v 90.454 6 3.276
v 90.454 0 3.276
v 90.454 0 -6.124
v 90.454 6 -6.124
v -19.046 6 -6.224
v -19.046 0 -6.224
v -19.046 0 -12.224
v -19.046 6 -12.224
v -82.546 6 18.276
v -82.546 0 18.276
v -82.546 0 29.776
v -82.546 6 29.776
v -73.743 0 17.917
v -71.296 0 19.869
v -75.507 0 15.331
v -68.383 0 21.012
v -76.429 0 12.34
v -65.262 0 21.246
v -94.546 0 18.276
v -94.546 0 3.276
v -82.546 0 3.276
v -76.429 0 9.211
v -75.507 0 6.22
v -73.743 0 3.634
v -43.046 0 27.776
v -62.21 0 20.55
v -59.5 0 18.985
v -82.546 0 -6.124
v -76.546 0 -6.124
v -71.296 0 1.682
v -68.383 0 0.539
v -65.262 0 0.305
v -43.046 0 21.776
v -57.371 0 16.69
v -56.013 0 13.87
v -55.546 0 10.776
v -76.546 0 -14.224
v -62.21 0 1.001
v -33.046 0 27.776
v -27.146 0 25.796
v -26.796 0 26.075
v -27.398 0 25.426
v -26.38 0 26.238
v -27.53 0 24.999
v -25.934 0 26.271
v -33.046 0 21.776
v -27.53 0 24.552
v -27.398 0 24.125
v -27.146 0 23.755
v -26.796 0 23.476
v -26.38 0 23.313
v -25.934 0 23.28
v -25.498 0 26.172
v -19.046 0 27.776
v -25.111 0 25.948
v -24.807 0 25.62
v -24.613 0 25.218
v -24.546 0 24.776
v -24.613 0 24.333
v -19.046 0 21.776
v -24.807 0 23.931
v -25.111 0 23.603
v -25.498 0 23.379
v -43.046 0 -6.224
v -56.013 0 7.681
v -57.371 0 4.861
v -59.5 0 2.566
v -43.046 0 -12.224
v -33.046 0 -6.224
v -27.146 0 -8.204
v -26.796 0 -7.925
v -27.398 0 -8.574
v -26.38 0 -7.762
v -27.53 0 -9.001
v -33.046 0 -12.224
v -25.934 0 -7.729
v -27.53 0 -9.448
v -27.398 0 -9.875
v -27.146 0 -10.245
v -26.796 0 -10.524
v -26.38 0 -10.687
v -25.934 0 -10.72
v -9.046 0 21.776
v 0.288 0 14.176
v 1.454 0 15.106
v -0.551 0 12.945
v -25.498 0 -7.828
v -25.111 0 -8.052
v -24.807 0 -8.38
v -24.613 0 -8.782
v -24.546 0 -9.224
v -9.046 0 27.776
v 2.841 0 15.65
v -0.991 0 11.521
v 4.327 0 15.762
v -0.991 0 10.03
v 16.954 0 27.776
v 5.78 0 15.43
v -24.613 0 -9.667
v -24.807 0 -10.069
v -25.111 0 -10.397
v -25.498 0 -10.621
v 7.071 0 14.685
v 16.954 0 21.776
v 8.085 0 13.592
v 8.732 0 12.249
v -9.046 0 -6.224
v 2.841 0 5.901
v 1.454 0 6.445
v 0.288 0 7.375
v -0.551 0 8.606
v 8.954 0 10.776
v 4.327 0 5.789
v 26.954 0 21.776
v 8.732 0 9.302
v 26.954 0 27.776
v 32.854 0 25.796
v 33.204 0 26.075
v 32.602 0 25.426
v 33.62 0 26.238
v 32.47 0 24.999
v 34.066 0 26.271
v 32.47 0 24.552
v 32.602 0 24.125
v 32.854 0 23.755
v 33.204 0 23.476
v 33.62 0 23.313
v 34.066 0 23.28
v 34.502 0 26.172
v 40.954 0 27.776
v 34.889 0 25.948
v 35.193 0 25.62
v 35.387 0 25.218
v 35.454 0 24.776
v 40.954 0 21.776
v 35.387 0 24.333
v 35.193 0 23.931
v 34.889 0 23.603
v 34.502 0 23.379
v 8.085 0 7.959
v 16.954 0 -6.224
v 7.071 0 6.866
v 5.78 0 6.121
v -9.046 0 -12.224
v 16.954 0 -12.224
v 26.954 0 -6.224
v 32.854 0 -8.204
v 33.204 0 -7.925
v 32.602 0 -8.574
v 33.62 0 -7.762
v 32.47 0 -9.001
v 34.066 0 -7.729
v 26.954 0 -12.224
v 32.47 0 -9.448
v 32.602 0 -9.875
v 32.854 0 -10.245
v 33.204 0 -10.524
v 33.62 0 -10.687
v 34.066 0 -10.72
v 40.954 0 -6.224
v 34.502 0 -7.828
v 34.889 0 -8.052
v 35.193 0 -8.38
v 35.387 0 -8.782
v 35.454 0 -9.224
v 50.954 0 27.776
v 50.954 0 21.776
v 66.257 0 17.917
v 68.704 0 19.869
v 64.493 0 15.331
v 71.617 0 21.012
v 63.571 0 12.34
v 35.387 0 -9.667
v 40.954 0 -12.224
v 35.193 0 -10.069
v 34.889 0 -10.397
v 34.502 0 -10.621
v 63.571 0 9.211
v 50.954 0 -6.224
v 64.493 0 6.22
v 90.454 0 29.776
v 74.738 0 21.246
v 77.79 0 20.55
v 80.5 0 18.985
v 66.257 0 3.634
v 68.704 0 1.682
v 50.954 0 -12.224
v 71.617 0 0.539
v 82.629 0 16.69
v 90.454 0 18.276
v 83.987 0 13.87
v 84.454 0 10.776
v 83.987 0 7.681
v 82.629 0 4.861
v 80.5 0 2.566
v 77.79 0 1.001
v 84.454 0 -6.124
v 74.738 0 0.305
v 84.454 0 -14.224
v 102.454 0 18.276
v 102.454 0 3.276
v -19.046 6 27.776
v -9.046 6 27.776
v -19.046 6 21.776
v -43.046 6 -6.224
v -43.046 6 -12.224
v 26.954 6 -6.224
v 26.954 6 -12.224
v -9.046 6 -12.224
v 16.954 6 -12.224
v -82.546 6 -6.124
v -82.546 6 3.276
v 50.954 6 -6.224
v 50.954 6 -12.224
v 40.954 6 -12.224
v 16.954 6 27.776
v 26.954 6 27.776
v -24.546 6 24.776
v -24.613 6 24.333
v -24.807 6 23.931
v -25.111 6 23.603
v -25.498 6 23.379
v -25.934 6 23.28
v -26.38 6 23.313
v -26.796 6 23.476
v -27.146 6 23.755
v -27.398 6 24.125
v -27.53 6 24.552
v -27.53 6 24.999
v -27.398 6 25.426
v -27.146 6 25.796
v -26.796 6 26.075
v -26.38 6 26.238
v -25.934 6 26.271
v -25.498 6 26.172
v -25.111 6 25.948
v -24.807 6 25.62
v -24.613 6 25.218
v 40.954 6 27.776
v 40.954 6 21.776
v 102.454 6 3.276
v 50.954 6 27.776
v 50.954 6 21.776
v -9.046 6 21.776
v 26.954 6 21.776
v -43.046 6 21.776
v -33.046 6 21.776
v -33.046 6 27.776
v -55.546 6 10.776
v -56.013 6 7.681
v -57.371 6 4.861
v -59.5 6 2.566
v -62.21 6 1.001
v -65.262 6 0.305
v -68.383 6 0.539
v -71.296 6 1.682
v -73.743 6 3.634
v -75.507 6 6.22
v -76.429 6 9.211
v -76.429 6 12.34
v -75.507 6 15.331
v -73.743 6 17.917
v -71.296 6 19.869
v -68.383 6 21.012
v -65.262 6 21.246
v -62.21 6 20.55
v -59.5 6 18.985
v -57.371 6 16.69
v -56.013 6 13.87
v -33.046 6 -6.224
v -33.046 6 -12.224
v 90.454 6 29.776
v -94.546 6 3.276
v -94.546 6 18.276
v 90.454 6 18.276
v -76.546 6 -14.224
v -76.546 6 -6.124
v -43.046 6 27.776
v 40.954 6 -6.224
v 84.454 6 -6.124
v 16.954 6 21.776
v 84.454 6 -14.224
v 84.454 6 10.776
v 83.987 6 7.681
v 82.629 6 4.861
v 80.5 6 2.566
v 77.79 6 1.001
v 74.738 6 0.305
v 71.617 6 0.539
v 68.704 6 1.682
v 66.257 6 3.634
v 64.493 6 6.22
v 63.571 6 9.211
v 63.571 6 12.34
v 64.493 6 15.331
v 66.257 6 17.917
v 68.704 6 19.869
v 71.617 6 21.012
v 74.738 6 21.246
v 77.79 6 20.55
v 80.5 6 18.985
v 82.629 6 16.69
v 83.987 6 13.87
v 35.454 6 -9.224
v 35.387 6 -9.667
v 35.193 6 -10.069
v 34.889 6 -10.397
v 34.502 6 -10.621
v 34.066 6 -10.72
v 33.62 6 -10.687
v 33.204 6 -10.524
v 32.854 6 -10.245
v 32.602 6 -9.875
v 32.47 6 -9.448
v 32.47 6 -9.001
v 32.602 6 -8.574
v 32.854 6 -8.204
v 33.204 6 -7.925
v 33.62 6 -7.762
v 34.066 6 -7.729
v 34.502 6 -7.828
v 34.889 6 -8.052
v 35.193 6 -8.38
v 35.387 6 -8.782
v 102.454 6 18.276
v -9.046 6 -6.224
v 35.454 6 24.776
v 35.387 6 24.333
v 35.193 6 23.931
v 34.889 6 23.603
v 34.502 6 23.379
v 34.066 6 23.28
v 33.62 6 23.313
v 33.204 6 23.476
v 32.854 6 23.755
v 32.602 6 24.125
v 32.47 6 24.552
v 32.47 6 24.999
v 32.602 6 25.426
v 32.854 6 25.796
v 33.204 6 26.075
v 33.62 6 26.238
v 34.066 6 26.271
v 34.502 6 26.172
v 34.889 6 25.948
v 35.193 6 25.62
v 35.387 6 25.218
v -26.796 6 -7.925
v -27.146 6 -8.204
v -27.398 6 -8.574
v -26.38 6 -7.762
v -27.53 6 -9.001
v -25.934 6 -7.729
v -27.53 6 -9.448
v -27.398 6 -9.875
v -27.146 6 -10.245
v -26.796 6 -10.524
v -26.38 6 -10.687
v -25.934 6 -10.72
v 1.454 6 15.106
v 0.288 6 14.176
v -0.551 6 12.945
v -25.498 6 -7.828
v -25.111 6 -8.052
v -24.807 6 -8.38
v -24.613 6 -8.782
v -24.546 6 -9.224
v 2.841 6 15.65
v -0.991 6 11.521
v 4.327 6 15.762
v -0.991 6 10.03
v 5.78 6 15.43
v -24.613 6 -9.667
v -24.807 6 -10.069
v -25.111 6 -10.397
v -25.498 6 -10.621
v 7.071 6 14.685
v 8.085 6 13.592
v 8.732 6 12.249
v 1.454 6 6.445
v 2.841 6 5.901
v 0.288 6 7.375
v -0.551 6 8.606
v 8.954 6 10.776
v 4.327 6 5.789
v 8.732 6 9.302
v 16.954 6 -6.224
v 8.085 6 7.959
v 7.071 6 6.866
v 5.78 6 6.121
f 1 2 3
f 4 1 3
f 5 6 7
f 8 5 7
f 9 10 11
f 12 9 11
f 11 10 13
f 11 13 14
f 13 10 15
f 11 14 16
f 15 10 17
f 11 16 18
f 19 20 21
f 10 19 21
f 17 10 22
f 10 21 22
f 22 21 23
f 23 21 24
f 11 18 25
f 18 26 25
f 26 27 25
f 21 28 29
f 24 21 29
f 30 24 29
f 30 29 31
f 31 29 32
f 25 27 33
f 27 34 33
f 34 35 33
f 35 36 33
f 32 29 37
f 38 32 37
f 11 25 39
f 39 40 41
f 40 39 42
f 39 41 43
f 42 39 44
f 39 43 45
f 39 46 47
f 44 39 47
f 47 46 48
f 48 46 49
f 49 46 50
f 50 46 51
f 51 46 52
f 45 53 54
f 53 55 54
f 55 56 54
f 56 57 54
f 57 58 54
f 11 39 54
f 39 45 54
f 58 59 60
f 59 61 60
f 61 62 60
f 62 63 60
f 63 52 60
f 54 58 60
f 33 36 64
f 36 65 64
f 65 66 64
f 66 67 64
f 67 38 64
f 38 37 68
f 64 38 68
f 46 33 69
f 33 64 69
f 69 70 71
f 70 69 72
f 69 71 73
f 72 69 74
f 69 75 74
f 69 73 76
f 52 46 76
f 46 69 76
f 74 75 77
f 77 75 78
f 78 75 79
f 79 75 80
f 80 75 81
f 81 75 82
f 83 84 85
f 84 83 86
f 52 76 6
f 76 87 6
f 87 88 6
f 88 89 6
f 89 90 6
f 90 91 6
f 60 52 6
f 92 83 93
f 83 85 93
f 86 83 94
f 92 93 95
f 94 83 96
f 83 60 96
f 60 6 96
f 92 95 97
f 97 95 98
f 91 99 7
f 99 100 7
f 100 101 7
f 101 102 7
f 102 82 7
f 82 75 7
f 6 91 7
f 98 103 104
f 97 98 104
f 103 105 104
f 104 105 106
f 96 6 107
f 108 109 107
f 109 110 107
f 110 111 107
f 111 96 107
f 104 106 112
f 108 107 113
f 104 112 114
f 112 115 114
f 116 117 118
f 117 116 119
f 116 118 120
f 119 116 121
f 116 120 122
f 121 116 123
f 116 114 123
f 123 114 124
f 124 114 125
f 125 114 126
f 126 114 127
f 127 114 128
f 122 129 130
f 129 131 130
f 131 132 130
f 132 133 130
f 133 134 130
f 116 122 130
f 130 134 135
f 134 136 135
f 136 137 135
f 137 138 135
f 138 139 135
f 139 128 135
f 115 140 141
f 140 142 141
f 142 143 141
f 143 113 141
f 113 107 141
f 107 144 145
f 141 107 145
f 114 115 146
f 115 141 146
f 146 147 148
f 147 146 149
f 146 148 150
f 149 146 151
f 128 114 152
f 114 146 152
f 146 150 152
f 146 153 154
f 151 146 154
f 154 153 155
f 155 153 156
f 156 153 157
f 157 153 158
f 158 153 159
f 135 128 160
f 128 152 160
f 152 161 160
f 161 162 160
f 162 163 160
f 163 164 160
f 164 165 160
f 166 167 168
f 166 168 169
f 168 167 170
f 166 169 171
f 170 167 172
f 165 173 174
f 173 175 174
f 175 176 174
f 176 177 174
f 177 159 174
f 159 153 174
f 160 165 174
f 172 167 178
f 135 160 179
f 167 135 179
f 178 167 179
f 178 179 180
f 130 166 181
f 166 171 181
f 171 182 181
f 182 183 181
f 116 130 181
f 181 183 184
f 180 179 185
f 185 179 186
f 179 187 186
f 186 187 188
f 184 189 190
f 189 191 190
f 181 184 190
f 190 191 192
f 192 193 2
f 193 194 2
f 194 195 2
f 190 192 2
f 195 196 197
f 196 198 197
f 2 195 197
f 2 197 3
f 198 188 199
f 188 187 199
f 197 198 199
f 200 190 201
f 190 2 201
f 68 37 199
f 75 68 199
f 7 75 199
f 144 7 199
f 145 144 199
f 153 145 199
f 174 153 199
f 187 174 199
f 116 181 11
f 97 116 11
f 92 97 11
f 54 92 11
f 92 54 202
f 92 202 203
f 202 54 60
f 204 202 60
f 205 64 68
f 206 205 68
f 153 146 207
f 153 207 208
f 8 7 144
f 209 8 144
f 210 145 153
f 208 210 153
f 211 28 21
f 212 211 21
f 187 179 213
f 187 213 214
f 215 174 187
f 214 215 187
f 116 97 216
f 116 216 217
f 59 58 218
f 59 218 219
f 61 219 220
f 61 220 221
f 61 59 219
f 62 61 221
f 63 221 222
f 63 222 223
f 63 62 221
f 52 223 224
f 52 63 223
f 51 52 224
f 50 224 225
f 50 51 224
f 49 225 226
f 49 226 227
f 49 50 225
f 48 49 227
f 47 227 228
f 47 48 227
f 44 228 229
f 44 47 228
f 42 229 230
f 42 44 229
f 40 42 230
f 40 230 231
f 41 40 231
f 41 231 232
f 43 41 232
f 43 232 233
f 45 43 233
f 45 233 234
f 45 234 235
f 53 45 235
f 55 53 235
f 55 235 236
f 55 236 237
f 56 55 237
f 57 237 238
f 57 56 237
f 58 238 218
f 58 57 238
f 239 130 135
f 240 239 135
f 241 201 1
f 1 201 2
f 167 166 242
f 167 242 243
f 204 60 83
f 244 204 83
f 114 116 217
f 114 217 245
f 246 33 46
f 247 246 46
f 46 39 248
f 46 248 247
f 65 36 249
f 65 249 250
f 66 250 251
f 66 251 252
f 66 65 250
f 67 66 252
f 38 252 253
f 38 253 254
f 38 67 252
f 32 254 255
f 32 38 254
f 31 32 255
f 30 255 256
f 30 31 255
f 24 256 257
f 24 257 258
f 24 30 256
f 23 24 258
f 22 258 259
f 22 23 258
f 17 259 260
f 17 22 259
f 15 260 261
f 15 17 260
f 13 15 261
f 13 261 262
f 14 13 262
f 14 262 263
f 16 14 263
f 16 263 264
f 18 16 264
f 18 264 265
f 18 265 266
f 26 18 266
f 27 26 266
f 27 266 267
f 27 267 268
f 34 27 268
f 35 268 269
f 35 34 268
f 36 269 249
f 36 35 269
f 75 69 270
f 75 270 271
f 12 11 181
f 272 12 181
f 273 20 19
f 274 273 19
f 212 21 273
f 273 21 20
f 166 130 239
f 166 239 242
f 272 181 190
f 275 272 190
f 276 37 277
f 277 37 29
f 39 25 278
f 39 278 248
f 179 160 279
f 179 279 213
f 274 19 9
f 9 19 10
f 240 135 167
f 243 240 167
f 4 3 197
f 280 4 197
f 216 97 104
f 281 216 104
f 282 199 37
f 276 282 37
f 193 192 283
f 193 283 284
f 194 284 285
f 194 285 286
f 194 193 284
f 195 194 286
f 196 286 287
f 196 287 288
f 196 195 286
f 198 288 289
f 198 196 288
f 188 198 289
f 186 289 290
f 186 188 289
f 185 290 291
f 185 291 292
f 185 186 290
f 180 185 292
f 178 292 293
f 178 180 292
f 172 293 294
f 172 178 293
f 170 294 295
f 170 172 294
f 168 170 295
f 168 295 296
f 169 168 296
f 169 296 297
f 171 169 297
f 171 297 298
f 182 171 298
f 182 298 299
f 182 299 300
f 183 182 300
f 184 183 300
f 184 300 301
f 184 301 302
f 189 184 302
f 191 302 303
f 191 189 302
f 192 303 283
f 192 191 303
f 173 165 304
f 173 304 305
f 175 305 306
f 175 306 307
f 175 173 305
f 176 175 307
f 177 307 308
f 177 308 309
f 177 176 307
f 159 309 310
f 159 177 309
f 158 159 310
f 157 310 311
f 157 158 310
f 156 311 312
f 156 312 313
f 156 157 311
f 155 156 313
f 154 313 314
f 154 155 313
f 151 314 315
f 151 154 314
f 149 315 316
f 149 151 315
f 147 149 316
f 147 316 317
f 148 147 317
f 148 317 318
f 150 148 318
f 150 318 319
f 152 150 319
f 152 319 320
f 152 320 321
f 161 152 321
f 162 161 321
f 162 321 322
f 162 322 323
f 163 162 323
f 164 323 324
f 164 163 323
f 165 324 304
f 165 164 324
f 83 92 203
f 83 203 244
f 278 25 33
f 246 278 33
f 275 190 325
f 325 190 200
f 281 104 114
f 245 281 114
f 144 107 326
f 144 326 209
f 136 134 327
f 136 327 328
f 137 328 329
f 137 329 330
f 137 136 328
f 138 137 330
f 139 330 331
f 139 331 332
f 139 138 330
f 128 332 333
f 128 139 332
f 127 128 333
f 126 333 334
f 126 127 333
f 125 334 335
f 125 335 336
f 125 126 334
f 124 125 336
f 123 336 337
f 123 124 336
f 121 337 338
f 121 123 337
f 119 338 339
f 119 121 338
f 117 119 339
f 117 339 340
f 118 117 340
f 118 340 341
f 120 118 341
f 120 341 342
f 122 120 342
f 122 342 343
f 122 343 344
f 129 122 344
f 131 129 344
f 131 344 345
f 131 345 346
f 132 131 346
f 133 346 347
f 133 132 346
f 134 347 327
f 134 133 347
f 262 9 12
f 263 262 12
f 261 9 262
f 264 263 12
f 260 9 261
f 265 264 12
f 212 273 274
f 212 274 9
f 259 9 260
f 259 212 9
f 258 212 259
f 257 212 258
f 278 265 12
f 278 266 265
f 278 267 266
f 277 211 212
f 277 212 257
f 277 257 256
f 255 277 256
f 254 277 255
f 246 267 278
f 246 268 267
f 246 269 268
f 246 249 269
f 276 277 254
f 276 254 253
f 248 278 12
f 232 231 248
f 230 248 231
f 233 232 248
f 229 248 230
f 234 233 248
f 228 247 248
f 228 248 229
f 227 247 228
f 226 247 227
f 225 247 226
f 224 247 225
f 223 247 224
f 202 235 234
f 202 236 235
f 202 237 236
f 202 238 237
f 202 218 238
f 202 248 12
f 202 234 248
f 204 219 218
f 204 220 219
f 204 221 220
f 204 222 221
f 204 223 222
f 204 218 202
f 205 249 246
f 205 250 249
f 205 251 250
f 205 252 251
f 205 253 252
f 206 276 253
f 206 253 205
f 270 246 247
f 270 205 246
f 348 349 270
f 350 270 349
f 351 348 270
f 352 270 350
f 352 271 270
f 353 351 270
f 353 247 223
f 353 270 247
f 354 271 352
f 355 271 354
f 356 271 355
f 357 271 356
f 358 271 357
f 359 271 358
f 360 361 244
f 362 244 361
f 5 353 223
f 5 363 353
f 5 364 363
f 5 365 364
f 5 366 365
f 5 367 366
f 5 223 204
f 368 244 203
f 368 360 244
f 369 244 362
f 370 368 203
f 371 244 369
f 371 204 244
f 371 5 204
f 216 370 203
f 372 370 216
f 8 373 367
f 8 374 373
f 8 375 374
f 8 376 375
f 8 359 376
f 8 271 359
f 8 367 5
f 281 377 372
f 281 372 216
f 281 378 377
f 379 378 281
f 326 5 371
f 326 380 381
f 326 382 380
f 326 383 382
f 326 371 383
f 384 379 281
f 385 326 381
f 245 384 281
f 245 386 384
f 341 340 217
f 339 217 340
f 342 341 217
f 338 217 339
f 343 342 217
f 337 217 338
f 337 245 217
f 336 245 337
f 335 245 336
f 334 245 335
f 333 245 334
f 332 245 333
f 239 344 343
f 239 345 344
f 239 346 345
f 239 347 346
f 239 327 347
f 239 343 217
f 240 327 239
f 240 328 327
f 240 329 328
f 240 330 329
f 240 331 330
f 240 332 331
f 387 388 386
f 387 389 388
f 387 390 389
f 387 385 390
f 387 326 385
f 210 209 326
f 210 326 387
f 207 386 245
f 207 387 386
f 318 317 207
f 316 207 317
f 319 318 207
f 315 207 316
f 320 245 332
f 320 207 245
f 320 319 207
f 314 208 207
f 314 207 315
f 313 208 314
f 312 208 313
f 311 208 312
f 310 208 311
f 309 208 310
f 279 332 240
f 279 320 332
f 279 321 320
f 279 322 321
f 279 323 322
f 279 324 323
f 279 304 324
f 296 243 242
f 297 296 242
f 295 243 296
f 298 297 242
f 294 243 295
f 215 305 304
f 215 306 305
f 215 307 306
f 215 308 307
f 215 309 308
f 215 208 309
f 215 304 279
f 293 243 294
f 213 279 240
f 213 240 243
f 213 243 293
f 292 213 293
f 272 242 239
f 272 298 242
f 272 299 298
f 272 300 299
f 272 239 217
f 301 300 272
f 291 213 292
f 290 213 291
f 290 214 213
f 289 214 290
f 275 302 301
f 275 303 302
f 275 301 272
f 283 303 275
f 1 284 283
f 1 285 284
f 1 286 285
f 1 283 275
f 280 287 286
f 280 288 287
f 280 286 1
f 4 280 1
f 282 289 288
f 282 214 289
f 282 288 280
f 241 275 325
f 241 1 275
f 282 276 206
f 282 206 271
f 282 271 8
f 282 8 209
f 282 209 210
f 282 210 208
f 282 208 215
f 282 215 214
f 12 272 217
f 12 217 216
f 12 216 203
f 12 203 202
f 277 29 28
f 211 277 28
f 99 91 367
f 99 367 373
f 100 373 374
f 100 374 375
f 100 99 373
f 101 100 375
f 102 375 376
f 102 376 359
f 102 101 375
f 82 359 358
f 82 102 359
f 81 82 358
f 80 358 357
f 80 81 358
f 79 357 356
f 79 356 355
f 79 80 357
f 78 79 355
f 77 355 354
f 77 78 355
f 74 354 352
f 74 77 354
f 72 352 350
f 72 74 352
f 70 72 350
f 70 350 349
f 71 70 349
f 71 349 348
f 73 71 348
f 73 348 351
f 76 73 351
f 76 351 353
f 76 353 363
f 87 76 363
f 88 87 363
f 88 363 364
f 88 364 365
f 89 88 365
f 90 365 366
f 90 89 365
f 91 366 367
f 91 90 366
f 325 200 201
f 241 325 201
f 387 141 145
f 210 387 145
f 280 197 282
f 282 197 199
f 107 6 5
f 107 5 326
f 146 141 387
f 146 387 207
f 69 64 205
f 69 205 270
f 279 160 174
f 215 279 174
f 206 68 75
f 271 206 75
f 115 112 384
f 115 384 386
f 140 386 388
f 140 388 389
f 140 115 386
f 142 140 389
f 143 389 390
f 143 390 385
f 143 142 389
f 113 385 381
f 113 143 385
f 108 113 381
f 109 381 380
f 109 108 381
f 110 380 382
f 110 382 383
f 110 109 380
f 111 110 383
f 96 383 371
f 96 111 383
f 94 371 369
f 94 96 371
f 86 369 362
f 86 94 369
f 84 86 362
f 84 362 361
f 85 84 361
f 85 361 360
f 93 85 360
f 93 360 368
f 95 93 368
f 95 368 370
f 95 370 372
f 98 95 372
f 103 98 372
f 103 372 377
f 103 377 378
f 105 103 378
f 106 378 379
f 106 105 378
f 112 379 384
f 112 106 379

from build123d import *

# Parameters (mm, degrees)
SKETCH_1_R      = 1.5
SKETCH_1_R_2    = 10.5
SKETCH_1_R_3    = 5
SKETCH_1_W      = 10
SKETCH_1_H      = 6
EXTRUDE_1_DEPTH = 6


with BuildPart() as part:
    # Эскиз1 → Бобышка-Вытянуть1 (new body)
    with BuildSketch(Plane(origin=(0, 0, 0), x_dir=(1, 0, 0), z_dir=(0, 1, 0))):
        Polygon((90.453646354, -29.775504496), (90.453646354, -18.275504496), (102.453646354, -18.275504496), (102.453646354, -3.275504496), (90.453646354, -3.275504496), (90.453646354, 6.124495504), (84.453646354, 6.124495504), (84.453646354, 14.224495504), (-76.546353646, 14.224495504), (-76.546353646, 6.124495504), (-82.546353646, 6.124495504), (-82.546353646, -3.275504496), (-94.546353646, -3.275504496), (-94.546353646, -18.275504496), (-82.546353646, -18.275504496), (-82.546353646, -29.775504496), align=None)
        with Locations((-26.046353646, -24.775504496)):
            Circle(SKETCH_1_R, mode=Mode.SUBTRACT)
        with Locations((-66.046353646, -10.775504496)):
            Circle(SKETCH_1_R_2, mode=Mode.SUBTRACT)
        with Locations((-26.046353646, 9.224495504)):
            Circle(SKETCH_1_R, mode=Mode.SUBTRACT)
        with Locations((33.953646354, -24.775504496)):
            Circle(SKETCH_1_R, mode=Mode.SUBTRACT)
        with Locations((73.953646354, -10.775504496)):
            Circle(SKETCH_1_R_2, mode=Mode.SUBTRACT)
        with Locations((33.953646354, 9.224495504)):
            Circle(SKETCH_1_R, mode=Mode.SUBTRACT)
        with Locations((3.953646354, -10.775504496)):
            Circle(SKETCH_1_R_3, mode=Mode.SUBTRACT)
        with Locations((-14.046353646, -24.775504496)):
            Rectangle(SKETCH_1_W, SKETCH_1_H, mode=Mode.SUBTRACT)
        with Locations((-38.046353646, -24.775504496)):
            Rectangle(SKETCH_1_W, SKETCH_1_H, mode=Mode.SUBTRACT)
        with Locations((-14.046353646, 9.224495504)):
            Rectangle(SKETCH_1_W, SKETCH_1_H, mode=Mode.SUBTRACT)
        with Locations((-38.046353646, 9.224495504)):
            Rectangle(SKETCH_1_W, SKETCH_1_H, mode=Mode.SUBTRACT)
        with Locations((21.953646354, -24.775504496)):
            Rectangle(SKETCH_1_W, SKETCH_1_H, mode=Mode.SUBTRACT)
        with Locations((45.953646354, -24.775504496)):
            Rectangle(SKETCH_1_W, SKETCH_1_H, mode=Mode.SUBTRACT)
        with Locations((21.953646354, 9.224495504)):
            Rectangle(SKETCH_1_W, SKETCH_1_H, mode=Mode.SUBTRACT)
        with Locations((45.953646354, 9.224495504)):
            Rectangle(SKETCH_1_W, SKETCH_1_H, mode=Mode.SUBTRACT)
    extrude(amount=EXTRUDE_1_DEPTH)


solid = part.part
